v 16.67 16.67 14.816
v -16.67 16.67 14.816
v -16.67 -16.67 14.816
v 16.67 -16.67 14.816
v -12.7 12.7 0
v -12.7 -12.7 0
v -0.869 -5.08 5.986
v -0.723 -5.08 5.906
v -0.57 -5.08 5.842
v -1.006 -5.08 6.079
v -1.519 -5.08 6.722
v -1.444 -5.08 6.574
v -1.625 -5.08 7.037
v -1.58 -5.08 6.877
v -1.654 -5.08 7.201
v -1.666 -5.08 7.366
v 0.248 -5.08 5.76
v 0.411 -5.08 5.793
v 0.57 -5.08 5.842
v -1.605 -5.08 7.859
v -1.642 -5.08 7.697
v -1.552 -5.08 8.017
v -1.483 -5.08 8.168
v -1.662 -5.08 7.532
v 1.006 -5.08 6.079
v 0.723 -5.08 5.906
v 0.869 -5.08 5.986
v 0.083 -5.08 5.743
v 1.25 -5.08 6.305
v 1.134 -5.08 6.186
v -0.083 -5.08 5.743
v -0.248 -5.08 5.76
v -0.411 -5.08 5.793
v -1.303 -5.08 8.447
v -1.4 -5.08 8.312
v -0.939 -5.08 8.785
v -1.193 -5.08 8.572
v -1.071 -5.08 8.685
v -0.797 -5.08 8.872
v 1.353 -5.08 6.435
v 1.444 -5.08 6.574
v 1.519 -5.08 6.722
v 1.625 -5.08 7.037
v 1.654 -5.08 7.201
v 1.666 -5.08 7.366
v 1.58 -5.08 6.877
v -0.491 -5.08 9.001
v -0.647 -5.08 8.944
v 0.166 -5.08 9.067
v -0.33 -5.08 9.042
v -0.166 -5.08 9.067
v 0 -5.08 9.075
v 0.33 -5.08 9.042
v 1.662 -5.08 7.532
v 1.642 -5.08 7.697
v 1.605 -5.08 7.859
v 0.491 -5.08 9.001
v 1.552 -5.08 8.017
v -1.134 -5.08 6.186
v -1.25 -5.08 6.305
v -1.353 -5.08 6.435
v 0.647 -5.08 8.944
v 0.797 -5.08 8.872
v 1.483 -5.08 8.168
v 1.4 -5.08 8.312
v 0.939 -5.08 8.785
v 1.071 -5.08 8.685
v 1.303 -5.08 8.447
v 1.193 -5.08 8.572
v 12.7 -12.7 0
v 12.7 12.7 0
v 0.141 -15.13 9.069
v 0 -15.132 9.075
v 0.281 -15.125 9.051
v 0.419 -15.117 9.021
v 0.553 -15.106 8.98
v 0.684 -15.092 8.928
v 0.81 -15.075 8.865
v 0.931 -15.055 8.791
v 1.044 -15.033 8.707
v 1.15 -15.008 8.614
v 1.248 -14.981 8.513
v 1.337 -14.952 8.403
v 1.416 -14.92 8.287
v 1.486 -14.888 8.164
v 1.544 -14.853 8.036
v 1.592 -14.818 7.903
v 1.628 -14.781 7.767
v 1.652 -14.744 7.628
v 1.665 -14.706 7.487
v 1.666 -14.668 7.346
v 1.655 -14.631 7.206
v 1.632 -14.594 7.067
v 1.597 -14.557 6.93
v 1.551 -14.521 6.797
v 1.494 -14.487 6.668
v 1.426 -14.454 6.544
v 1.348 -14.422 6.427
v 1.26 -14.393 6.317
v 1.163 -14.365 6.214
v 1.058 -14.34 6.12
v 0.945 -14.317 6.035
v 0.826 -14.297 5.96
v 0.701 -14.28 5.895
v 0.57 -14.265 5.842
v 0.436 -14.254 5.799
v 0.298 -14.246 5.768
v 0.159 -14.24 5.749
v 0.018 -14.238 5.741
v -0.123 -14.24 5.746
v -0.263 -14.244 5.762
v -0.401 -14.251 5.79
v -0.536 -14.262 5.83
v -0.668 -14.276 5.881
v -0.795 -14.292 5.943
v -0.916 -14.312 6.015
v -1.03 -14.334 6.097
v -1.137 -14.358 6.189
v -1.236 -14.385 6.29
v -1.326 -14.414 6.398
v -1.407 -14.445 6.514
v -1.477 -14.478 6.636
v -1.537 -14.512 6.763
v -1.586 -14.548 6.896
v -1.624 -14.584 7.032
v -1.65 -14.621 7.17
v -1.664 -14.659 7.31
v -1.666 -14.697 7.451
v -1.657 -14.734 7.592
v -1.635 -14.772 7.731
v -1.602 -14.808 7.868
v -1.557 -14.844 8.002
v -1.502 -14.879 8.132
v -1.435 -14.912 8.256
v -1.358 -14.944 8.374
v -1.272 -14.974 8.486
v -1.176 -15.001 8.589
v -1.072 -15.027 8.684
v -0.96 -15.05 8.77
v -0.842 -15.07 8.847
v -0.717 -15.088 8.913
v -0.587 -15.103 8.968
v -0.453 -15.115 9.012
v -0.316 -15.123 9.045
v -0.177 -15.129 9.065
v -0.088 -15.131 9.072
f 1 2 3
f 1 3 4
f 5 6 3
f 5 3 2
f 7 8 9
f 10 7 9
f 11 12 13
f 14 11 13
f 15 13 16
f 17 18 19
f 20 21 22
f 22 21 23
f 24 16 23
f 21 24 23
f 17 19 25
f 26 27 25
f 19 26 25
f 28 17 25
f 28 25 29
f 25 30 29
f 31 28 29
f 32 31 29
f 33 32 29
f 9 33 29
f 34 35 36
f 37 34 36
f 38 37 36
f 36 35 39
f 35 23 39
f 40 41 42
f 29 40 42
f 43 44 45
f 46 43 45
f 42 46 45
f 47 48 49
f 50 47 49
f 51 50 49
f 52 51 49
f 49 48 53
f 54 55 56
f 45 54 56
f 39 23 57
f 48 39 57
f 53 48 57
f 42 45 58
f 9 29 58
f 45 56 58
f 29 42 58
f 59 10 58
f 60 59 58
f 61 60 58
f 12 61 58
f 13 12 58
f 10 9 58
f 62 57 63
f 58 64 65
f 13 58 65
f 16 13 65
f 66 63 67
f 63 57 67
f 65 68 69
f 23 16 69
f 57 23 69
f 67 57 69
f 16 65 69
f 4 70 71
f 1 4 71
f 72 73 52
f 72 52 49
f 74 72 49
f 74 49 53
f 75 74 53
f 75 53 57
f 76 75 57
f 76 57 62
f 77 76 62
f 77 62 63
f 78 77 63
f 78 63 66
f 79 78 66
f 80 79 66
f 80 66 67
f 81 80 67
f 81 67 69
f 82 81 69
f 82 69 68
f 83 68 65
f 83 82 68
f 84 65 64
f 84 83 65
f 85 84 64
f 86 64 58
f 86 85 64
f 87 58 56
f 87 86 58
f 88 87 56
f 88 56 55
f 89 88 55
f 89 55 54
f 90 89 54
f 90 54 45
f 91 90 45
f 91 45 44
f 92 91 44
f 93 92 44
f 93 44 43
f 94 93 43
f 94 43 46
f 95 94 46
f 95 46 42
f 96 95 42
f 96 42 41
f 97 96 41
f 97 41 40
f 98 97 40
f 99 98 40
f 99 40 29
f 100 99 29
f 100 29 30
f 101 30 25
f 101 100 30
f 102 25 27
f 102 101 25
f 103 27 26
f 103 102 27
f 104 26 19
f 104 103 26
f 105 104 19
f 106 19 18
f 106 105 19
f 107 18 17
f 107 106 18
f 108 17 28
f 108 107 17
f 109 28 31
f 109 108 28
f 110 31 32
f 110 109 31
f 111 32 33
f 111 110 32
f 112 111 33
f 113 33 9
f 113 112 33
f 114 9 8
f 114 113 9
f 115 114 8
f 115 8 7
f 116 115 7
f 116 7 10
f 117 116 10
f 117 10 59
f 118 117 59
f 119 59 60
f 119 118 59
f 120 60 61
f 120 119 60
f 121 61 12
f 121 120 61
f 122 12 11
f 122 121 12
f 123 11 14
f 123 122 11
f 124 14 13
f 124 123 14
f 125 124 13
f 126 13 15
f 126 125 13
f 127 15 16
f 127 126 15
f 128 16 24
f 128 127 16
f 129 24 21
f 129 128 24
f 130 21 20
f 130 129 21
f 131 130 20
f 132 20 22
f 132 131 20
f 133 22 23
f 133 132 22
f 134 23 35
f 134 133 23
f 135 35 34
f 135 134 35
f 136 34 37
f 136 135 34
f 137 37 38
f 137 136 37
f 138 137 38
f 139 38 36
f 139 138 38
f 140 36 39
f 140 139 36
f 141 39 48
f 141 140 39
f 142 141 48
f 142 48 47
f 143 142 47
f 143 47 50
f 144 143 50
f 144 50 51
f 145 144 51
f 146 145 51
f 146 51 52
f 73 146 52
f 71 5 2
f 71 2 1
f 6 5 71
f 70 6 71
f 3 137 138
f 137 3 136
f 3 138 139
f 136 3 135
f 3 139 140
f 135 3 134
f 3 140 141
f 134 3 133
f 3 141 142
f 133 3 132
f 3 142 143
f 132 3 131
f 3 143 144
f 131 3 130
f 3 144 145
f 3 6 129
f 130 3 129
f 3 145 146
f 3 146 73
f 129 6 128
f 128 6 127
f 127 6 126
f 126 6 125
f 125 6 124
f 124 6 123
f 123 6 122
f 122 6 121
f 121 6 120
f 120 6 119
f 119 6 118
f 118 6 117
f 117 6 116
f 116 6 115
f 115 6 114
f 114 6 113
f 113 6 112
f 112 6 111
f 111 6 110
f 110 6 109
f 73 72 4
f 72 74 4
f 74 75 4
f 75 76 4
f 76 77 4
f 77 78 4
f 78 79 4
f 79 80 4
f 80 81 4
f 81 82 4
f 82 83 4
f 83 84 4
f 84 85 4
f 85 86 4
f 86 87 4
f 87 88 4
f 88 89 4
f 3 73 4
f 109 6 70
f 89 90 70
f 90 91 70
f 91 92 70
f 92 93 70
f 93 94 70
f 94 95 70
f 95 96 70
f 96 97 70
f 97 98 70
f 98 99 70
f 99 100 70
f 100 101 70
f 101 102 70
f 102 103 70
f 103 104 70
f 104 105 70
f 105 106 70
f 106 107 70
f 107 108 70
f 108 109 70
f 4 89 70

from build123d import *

# Parameters (mm, degrees)
ESQUISSE1_W             = 25.4
ESQUISSE1_H             = 25.4
BOSS_EXTRU_1_DEPTH      = 14.81582
BOSS_EXTRU_1_DRAFT      = -15
ENL_V_MAT_EXTRU_1_DEPTH = 12.7


with BuildPart() as part:
    # Esquisse1 → Boss.-Extru.1 (with draft: the straight prism first)
    with BuildSketch(Plane.XY):
        Rectangle(ESQUISSE1_W, ESQUISSE1_H)
    extrude(amount=BOSS_EXTRU_1_DEPTH)
    # Boss.-Extru.1: the draft: its side faces are tilted about the plane it starts from
    boss_extru_1_sides = [part.faces().sort_by_distance(p)[0] for p in [
        (0, -12.7, 7.40791),
        (12.7, 0, 7.40791),
        (0, 12.7, 7.40791),
        (-12.7, 0, 7.40791),
    ]]
    draft(boss_extru_1_sides, Plane.XY, BOSS_EXTRU_1_DRAFT)

    # Esquisse5 → Enlèv. mat.-Extru.1 (cut)
    with BuildSketch(Plane(origin=(0, -17.78, 0), x_dir=(1, 0, 0), z_dir=(0, 1, 0))):
        with BuildLine():
            ThreePointArc((0, -5.741035), (-1.178658616, -8.586568616), (1.666875, -7.40791))
            ThreePointArc((1.666875, -7.40791), (1.178658616, -6.229251384), (0, -5.741035))
        make_face()
    extrude(amount=ENL_V_MAT_EXTRU_1_DEPTH, mode=Mode.SUBTRACT)


solid = part.part
